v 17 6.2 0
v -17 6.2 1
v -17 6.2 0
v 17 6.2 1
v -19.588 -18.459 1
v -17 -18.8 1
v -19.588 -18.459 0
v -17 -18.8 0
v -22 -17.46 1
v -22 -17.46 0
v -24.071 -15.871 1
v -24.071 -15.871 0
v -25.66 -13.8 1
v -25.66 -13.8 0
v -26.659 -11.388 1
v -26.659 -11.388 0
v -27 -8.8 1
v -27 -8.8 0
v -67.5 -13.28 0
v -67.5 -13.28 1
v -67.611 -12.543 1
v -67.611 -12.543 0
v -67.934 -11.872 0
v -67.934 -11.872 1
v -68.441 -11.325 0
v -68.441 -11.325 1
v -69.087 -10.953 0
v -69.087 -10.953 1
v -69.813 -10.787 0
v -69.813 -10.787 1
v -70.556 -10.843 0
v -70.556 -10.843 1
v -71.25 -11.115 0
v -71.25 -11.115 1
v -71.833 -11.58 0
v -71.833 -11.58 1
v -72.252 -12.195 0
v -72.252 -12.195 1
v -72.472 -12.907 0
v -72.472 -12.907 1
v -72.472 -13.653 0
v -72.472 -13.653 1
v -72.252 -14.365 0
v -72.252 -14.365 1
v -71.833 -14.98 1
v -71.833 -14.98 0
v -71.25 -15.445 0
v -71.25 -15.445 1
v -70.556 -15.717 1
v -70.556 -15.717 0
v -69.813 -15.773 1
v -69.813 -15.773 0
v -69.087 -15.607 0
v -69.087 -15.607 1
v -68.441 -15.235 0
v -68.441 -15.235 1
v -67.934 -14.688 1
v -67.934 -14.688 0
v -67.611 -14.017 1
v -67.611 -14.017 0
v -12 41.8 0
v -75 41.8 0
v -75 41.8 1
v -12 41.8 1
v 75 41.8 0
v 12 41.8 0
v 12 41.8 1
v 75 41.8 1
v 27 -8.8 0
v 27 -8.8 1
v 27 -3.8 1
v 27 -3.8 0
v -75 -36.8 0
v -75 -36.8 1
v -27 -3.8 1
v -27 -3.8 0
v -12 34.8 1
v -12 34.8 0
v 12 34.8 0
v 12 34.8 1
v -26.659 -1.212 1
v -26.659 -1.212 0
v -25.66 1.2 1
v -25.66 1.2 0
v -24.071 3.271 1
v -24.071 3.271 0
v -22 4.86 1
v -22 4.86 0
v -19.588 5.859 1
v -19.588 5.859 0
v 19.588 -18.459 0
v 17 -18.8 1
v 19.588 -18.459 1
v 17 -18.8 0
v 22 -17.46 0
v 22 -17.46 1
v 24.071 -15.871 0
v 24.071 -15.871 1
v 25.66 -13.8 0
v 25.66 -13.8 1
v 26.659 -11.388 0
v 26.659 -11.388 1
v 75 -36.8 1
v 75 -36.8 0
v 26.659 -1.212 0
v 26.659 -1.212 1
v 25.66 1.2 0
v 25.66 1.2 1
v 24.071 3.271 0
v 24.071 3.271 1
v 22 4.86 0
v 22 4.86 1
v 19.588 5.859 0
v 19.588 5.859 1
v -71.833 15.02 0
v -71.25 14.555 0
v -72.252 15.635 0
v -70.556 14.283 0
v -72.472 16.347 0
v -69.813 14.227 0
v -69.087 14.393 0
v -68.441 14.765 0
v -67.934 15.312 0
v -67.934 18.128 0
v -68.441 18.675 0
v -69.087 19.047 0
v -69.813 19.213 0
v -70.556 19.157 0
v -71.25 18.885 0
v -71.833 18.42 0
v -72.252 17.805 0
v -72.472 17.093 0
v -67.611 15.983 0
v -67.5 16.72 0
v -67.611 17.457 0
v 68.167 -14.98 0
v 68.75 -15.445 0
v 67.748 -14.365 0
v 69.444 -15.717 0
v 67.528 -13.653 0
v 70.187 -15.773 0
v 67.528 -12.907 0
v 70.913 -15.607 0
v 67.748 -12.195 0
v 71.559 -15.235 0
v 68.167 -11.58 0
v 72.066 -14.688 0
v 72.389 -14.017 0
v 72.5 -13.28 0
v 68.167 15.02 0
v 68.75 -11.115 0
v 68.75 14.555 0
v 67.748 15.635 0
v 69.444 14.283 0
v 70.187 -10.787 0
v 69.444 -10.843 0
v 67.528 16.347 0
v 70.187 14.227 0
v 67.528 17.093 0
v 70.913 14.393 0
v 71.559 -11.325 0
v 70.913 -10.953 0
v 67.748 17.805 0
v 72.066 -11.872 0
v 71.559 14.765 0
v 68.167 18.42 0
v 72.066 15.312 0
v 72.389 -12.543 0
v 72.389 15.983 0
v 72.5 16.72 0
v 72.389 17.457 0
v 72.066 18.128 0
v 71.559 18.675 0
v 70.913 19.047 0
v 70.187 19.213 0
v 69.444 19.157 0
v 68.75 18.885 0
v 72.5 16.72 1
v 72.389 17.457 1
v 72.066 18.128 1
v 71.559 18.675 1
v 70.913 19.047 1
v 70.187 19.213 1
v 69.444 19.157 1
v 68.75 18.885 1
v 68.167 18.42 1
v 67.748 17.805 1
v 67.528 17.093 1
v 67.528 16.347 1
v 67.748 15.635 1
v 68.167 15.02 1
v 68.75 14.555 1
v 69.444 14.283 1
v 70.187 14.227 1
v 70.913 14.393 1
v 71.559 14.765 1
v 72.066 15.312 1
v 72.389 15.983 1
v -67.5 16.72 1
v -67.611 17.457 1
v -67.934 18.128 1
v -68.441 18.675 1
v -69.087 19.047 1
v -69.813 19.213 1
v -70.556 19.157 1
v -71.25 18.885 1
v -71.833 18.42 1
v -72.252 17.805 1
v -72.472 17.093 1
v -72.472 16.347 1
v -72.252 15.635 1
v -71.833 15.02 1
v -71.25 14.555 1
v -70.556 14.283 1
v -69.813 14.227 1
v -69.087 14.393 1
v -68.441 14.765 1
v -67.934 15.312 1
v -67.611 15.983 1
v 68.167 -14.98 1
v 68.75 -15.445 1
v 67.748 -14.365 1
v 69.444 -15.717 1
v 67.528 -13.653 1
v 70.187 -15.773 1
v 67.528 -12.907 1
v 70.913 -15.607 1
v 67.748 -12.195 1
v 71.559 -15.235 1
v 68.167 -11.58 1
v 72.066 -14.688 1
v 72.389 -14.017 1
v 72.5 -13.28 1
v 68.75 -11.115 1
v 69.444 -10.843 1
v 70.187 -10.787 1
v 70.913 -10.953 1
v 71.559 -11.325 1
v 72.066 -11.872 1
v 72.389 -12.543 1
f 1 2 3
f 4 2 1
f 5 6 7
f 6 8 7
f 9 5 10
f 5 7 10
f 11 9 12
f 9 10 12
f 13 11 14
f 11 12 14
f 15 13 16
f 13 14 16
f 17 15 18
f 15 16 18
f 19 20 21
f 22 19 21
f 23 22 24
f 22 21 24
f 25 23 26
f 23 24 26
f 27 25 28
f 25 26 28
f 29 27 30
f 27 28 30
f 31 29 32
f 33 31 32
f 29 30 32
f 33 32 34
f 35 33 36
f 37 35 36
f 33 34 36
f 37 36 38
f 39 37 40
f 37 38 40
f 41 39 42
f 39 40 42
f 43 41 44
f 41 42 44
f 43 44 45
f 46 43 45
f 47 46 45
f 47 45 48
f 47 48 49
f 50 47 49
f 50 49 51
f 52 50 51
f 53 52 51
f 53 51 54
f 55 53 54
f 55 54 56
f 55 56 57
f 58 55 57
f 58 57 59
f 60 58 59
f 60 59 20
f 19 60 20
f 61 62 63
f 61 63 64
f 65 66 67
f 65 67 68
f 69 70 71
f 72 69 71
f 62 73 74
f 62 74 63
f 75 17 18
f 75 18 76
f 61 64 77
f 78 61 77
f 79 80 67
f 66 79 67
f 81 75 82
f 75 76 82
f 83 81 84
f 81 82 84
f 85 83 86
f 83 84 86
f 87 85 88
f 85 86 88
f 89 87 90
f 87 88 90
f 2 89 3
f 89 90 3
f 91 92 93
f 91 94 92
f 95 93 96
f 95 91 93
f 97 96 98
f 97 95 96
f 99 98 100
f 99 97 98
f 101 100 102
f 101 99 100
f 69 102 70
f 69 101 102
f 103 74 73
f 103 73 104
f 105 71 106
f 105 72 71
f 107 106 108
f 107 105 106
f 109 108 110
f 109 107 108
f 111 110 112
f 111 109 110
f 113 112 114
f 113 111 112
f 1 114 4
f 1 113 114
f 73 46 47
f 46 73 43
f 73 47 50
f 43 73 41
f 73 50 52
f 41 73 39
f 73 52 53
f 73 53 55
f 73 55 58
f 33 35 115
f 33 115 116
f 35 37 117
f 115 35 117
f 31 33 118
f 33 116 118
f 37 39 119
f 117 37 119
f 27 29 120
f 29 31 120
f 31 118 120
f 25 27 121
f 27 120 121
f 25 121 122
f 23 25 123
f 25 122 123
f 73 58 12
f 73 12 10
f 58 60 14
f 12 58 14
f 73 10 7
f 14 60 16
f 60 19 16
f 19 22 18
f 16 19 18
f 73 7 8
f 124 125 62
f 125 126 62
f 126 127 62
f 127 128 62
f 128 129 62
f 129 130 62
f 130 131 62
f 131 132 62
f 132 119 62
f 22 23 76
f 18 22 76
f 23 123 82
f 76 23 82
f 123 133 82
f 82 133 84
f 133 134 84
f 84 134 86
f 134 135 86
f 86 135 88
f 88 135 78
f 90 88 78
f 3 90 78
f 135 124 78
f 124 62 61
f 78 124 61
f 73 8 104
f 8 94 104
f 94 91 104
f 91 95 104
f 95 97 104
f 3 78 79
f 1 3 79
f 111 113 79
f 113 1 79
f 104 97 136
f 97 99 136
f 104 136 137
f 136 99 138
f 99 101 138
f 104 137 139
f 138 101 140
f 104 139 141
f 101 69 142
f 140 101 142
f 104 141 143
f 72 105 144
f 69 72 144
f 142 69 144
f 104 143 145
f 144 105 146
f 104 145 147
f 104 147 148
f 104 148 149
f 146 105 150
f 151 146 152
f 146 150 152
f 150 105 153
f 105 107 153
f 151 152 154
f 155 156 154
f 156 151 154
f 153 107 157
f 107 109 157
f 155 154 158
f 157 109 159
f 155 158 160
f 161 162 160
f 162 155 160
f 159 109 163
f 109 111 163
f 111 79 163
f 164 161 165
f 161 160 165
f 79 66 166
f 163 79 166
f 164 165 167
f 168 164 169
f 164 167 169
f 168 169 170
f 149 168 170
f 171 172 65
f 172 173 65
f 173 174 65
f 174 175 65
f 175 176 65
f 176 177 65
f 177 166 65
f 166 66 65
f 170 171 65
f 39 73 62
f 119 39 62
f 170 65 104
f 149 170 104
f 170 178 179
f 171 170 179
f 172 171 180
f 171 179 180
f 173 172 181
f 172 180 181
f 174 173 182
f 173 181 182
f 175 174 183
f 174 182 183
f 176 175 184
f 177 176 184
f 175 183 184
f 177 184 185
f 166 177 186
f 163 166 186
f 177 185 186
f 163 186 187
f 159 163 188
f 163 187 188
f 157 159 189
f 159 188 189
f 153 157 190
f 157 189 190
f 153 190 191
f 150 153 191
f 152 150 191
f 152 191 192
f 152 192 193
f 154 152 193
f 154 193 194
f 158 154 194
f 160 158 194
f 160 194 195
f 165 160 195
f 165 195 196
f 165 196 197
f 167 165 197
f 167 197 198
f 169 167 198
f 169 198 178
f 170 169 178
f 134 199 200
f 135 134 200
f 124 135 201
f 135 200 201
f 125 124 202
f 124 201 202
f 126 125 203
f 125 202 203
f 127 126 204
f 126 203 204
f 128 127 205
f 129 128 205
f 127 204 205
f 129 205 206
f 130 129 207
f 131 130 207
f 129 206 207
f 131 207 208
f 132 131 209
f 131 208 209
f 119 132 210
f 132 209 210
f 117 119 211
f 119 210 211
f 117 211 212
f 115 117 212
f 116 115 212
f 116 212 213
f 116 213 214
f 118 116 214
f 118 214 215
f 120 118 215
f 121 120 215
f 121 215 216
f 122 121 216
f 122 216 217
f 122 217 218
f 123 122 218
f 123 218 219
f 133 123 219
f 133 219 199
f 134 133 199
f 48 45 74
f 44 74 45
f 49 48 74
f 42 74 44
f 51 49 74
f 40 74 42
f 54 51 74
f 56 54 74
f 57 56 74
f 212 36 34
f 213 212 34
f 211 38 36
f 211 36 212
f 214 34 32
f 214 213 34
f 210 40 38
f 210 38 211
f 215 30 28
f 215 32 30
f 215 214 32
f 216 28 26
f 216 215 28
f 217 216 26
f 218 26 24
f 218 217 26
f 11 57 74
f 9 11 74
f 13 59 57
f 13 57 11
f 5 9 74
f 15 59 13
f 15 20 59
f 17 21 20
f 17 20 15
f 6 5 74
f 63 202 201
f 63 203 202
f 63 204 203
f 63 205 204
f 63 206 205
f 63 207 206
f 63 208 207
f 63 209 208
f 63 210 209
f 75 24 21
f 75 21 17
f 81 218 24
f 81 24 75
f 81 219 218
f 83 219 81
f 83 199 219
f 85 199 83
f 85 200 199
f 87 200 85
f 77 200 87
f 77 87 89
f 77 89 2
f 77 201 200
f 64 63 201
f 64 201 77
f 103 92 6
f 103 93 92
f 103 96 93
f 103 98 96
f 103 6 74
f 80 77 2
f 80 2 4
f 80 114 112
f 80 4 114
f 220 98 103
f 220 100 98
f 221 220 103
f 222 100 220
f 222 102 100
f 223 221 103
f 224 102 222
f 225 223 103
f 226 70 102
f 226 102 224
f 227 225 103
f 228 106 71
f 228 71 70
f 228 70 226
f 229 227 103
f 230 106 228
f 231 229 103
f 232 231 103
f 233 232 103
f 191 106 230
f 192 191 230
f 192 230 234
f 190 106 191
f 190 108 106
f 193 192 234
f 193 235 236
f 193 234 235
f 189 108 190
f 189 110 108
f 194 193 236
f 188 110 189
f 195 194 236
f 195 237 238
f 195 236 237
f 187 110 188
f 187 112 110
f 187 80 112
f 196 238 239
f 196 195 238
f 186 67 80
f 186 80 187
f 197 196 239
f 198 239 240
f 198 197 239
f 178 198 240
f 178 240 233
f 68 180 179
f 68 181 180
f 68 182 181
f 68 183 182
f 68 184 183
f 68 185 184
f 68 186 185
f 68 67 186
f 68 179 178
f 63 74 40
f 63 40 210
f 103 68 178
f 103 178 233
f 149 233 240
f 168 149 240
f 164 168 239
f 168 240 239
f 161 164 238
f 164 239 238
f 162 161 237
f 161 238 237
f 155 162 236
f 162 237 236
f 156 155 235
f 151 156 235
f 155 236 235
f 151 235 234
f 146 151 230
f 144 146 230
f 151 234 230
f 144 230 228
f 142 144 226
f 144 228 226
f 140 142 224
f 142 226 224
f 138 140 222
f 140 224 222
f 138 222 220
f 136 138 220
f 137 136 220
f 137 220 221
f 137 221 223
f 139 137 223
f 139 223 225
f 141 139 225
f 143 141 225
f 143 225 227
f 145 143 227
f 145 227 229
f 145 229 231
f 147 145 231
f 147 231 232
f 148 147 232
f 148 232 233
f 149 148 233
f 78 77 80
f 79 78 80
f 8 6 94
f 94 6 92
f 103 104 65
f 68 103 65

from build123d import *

# Parameters (mm, degrees)
SKETCH1_W           = 150
SKETCH1_H           = 83.6
BOSS_EXTRUDE1_DEPTH = 1
SKETCH2_W           = 54
SKETCH2_H           = 25
CUT_EXTRUDE1_DEPTH  = 86.867572459
SKETCH3_R           = 2.5
CUT_EXTRUDE2_DEPTH  = 6.5
CUT_EXTRUDE3_DEPTH  = 10
FILLET1_R           = 10
SKETCH5_W           = 150
SKETCH5_H           = 5
CUT_EXTRUDE4_DEPTH  = 10


with BuildPart() as part:
    # Sketch1 → Boss-Extrude1 (new body)
    with BuildSketch(Plane.XY):
        Rectangle(SKETCH1_W, SKETCH1_H)
    extrude(amount=BOSS_EXTRUDE1_DEPTH)

    # Sketch2 → Cut-Extrude1 (cut, through all)
    with BuildSketch(Plane.XY.offset(1)):
        with Locations((0, -6.3)):
            Rectangle(SKETCH2_W, SKETCH2_H)
    extrude(amount=-CUT_EXTRUDE1_DEPTH, mode=Mode.SUBTRACT)

    # Sketch3 → Cut-Extrude2 (cut)
    with BuildSketch(Plane.XY.offset(1)):
        with Locations((-70, 16.72)):
            Circle(SKETCH3_R)
        with Locations((-70, -13.28)):
            Circle(SKETCH3_R)
        with Locations((70, 16.72)):
            Circle(SKETCH3_R)
        with Locations((70, -13.28)):
            Circle(SKETCH3_R)
    extrude(amount=-CUT_EXTRUDE2_DEPTH, mode=Mode.SUBTRACT)

    # Sketch4 → Cut-Extrude3 (cut)
    with BuildSketch(Plane.XY.offset(1)):
        Polygon((0, 34.8), (12, 34.8), (12, 41.8), (-12, 41.8), (-12, 34.8), align=None)
    extrude(amount=-CUT_EXTRUDE3_DEPTH, mode=Mode.SUBTRACT)

    # Fillet1
    fillet1_edges = [part.edges().sort_by_distance(p)[0] for p in [
        (27, -18.8, 0.5),
        (-27, -18.8, 0.5),
        (-27, 6.2, 0.5),
        (27, 6.2, 0.5),
    ]]
    fillet(fillet1_edges, radius=FILLET1_R)

    # Sketch5 → Cut-Extrude4 (cut)
    with BuildSketch(Plane.XY.offset(1)):
        with Locations((0, -39.3)):
            Rectangle(SKETCH5_W, SKETCH5_H)
    extrude(amount=-CUT_EXTRUDE4_DEPTH, mode=Mode.SUBTRACT)


solid = part.part
